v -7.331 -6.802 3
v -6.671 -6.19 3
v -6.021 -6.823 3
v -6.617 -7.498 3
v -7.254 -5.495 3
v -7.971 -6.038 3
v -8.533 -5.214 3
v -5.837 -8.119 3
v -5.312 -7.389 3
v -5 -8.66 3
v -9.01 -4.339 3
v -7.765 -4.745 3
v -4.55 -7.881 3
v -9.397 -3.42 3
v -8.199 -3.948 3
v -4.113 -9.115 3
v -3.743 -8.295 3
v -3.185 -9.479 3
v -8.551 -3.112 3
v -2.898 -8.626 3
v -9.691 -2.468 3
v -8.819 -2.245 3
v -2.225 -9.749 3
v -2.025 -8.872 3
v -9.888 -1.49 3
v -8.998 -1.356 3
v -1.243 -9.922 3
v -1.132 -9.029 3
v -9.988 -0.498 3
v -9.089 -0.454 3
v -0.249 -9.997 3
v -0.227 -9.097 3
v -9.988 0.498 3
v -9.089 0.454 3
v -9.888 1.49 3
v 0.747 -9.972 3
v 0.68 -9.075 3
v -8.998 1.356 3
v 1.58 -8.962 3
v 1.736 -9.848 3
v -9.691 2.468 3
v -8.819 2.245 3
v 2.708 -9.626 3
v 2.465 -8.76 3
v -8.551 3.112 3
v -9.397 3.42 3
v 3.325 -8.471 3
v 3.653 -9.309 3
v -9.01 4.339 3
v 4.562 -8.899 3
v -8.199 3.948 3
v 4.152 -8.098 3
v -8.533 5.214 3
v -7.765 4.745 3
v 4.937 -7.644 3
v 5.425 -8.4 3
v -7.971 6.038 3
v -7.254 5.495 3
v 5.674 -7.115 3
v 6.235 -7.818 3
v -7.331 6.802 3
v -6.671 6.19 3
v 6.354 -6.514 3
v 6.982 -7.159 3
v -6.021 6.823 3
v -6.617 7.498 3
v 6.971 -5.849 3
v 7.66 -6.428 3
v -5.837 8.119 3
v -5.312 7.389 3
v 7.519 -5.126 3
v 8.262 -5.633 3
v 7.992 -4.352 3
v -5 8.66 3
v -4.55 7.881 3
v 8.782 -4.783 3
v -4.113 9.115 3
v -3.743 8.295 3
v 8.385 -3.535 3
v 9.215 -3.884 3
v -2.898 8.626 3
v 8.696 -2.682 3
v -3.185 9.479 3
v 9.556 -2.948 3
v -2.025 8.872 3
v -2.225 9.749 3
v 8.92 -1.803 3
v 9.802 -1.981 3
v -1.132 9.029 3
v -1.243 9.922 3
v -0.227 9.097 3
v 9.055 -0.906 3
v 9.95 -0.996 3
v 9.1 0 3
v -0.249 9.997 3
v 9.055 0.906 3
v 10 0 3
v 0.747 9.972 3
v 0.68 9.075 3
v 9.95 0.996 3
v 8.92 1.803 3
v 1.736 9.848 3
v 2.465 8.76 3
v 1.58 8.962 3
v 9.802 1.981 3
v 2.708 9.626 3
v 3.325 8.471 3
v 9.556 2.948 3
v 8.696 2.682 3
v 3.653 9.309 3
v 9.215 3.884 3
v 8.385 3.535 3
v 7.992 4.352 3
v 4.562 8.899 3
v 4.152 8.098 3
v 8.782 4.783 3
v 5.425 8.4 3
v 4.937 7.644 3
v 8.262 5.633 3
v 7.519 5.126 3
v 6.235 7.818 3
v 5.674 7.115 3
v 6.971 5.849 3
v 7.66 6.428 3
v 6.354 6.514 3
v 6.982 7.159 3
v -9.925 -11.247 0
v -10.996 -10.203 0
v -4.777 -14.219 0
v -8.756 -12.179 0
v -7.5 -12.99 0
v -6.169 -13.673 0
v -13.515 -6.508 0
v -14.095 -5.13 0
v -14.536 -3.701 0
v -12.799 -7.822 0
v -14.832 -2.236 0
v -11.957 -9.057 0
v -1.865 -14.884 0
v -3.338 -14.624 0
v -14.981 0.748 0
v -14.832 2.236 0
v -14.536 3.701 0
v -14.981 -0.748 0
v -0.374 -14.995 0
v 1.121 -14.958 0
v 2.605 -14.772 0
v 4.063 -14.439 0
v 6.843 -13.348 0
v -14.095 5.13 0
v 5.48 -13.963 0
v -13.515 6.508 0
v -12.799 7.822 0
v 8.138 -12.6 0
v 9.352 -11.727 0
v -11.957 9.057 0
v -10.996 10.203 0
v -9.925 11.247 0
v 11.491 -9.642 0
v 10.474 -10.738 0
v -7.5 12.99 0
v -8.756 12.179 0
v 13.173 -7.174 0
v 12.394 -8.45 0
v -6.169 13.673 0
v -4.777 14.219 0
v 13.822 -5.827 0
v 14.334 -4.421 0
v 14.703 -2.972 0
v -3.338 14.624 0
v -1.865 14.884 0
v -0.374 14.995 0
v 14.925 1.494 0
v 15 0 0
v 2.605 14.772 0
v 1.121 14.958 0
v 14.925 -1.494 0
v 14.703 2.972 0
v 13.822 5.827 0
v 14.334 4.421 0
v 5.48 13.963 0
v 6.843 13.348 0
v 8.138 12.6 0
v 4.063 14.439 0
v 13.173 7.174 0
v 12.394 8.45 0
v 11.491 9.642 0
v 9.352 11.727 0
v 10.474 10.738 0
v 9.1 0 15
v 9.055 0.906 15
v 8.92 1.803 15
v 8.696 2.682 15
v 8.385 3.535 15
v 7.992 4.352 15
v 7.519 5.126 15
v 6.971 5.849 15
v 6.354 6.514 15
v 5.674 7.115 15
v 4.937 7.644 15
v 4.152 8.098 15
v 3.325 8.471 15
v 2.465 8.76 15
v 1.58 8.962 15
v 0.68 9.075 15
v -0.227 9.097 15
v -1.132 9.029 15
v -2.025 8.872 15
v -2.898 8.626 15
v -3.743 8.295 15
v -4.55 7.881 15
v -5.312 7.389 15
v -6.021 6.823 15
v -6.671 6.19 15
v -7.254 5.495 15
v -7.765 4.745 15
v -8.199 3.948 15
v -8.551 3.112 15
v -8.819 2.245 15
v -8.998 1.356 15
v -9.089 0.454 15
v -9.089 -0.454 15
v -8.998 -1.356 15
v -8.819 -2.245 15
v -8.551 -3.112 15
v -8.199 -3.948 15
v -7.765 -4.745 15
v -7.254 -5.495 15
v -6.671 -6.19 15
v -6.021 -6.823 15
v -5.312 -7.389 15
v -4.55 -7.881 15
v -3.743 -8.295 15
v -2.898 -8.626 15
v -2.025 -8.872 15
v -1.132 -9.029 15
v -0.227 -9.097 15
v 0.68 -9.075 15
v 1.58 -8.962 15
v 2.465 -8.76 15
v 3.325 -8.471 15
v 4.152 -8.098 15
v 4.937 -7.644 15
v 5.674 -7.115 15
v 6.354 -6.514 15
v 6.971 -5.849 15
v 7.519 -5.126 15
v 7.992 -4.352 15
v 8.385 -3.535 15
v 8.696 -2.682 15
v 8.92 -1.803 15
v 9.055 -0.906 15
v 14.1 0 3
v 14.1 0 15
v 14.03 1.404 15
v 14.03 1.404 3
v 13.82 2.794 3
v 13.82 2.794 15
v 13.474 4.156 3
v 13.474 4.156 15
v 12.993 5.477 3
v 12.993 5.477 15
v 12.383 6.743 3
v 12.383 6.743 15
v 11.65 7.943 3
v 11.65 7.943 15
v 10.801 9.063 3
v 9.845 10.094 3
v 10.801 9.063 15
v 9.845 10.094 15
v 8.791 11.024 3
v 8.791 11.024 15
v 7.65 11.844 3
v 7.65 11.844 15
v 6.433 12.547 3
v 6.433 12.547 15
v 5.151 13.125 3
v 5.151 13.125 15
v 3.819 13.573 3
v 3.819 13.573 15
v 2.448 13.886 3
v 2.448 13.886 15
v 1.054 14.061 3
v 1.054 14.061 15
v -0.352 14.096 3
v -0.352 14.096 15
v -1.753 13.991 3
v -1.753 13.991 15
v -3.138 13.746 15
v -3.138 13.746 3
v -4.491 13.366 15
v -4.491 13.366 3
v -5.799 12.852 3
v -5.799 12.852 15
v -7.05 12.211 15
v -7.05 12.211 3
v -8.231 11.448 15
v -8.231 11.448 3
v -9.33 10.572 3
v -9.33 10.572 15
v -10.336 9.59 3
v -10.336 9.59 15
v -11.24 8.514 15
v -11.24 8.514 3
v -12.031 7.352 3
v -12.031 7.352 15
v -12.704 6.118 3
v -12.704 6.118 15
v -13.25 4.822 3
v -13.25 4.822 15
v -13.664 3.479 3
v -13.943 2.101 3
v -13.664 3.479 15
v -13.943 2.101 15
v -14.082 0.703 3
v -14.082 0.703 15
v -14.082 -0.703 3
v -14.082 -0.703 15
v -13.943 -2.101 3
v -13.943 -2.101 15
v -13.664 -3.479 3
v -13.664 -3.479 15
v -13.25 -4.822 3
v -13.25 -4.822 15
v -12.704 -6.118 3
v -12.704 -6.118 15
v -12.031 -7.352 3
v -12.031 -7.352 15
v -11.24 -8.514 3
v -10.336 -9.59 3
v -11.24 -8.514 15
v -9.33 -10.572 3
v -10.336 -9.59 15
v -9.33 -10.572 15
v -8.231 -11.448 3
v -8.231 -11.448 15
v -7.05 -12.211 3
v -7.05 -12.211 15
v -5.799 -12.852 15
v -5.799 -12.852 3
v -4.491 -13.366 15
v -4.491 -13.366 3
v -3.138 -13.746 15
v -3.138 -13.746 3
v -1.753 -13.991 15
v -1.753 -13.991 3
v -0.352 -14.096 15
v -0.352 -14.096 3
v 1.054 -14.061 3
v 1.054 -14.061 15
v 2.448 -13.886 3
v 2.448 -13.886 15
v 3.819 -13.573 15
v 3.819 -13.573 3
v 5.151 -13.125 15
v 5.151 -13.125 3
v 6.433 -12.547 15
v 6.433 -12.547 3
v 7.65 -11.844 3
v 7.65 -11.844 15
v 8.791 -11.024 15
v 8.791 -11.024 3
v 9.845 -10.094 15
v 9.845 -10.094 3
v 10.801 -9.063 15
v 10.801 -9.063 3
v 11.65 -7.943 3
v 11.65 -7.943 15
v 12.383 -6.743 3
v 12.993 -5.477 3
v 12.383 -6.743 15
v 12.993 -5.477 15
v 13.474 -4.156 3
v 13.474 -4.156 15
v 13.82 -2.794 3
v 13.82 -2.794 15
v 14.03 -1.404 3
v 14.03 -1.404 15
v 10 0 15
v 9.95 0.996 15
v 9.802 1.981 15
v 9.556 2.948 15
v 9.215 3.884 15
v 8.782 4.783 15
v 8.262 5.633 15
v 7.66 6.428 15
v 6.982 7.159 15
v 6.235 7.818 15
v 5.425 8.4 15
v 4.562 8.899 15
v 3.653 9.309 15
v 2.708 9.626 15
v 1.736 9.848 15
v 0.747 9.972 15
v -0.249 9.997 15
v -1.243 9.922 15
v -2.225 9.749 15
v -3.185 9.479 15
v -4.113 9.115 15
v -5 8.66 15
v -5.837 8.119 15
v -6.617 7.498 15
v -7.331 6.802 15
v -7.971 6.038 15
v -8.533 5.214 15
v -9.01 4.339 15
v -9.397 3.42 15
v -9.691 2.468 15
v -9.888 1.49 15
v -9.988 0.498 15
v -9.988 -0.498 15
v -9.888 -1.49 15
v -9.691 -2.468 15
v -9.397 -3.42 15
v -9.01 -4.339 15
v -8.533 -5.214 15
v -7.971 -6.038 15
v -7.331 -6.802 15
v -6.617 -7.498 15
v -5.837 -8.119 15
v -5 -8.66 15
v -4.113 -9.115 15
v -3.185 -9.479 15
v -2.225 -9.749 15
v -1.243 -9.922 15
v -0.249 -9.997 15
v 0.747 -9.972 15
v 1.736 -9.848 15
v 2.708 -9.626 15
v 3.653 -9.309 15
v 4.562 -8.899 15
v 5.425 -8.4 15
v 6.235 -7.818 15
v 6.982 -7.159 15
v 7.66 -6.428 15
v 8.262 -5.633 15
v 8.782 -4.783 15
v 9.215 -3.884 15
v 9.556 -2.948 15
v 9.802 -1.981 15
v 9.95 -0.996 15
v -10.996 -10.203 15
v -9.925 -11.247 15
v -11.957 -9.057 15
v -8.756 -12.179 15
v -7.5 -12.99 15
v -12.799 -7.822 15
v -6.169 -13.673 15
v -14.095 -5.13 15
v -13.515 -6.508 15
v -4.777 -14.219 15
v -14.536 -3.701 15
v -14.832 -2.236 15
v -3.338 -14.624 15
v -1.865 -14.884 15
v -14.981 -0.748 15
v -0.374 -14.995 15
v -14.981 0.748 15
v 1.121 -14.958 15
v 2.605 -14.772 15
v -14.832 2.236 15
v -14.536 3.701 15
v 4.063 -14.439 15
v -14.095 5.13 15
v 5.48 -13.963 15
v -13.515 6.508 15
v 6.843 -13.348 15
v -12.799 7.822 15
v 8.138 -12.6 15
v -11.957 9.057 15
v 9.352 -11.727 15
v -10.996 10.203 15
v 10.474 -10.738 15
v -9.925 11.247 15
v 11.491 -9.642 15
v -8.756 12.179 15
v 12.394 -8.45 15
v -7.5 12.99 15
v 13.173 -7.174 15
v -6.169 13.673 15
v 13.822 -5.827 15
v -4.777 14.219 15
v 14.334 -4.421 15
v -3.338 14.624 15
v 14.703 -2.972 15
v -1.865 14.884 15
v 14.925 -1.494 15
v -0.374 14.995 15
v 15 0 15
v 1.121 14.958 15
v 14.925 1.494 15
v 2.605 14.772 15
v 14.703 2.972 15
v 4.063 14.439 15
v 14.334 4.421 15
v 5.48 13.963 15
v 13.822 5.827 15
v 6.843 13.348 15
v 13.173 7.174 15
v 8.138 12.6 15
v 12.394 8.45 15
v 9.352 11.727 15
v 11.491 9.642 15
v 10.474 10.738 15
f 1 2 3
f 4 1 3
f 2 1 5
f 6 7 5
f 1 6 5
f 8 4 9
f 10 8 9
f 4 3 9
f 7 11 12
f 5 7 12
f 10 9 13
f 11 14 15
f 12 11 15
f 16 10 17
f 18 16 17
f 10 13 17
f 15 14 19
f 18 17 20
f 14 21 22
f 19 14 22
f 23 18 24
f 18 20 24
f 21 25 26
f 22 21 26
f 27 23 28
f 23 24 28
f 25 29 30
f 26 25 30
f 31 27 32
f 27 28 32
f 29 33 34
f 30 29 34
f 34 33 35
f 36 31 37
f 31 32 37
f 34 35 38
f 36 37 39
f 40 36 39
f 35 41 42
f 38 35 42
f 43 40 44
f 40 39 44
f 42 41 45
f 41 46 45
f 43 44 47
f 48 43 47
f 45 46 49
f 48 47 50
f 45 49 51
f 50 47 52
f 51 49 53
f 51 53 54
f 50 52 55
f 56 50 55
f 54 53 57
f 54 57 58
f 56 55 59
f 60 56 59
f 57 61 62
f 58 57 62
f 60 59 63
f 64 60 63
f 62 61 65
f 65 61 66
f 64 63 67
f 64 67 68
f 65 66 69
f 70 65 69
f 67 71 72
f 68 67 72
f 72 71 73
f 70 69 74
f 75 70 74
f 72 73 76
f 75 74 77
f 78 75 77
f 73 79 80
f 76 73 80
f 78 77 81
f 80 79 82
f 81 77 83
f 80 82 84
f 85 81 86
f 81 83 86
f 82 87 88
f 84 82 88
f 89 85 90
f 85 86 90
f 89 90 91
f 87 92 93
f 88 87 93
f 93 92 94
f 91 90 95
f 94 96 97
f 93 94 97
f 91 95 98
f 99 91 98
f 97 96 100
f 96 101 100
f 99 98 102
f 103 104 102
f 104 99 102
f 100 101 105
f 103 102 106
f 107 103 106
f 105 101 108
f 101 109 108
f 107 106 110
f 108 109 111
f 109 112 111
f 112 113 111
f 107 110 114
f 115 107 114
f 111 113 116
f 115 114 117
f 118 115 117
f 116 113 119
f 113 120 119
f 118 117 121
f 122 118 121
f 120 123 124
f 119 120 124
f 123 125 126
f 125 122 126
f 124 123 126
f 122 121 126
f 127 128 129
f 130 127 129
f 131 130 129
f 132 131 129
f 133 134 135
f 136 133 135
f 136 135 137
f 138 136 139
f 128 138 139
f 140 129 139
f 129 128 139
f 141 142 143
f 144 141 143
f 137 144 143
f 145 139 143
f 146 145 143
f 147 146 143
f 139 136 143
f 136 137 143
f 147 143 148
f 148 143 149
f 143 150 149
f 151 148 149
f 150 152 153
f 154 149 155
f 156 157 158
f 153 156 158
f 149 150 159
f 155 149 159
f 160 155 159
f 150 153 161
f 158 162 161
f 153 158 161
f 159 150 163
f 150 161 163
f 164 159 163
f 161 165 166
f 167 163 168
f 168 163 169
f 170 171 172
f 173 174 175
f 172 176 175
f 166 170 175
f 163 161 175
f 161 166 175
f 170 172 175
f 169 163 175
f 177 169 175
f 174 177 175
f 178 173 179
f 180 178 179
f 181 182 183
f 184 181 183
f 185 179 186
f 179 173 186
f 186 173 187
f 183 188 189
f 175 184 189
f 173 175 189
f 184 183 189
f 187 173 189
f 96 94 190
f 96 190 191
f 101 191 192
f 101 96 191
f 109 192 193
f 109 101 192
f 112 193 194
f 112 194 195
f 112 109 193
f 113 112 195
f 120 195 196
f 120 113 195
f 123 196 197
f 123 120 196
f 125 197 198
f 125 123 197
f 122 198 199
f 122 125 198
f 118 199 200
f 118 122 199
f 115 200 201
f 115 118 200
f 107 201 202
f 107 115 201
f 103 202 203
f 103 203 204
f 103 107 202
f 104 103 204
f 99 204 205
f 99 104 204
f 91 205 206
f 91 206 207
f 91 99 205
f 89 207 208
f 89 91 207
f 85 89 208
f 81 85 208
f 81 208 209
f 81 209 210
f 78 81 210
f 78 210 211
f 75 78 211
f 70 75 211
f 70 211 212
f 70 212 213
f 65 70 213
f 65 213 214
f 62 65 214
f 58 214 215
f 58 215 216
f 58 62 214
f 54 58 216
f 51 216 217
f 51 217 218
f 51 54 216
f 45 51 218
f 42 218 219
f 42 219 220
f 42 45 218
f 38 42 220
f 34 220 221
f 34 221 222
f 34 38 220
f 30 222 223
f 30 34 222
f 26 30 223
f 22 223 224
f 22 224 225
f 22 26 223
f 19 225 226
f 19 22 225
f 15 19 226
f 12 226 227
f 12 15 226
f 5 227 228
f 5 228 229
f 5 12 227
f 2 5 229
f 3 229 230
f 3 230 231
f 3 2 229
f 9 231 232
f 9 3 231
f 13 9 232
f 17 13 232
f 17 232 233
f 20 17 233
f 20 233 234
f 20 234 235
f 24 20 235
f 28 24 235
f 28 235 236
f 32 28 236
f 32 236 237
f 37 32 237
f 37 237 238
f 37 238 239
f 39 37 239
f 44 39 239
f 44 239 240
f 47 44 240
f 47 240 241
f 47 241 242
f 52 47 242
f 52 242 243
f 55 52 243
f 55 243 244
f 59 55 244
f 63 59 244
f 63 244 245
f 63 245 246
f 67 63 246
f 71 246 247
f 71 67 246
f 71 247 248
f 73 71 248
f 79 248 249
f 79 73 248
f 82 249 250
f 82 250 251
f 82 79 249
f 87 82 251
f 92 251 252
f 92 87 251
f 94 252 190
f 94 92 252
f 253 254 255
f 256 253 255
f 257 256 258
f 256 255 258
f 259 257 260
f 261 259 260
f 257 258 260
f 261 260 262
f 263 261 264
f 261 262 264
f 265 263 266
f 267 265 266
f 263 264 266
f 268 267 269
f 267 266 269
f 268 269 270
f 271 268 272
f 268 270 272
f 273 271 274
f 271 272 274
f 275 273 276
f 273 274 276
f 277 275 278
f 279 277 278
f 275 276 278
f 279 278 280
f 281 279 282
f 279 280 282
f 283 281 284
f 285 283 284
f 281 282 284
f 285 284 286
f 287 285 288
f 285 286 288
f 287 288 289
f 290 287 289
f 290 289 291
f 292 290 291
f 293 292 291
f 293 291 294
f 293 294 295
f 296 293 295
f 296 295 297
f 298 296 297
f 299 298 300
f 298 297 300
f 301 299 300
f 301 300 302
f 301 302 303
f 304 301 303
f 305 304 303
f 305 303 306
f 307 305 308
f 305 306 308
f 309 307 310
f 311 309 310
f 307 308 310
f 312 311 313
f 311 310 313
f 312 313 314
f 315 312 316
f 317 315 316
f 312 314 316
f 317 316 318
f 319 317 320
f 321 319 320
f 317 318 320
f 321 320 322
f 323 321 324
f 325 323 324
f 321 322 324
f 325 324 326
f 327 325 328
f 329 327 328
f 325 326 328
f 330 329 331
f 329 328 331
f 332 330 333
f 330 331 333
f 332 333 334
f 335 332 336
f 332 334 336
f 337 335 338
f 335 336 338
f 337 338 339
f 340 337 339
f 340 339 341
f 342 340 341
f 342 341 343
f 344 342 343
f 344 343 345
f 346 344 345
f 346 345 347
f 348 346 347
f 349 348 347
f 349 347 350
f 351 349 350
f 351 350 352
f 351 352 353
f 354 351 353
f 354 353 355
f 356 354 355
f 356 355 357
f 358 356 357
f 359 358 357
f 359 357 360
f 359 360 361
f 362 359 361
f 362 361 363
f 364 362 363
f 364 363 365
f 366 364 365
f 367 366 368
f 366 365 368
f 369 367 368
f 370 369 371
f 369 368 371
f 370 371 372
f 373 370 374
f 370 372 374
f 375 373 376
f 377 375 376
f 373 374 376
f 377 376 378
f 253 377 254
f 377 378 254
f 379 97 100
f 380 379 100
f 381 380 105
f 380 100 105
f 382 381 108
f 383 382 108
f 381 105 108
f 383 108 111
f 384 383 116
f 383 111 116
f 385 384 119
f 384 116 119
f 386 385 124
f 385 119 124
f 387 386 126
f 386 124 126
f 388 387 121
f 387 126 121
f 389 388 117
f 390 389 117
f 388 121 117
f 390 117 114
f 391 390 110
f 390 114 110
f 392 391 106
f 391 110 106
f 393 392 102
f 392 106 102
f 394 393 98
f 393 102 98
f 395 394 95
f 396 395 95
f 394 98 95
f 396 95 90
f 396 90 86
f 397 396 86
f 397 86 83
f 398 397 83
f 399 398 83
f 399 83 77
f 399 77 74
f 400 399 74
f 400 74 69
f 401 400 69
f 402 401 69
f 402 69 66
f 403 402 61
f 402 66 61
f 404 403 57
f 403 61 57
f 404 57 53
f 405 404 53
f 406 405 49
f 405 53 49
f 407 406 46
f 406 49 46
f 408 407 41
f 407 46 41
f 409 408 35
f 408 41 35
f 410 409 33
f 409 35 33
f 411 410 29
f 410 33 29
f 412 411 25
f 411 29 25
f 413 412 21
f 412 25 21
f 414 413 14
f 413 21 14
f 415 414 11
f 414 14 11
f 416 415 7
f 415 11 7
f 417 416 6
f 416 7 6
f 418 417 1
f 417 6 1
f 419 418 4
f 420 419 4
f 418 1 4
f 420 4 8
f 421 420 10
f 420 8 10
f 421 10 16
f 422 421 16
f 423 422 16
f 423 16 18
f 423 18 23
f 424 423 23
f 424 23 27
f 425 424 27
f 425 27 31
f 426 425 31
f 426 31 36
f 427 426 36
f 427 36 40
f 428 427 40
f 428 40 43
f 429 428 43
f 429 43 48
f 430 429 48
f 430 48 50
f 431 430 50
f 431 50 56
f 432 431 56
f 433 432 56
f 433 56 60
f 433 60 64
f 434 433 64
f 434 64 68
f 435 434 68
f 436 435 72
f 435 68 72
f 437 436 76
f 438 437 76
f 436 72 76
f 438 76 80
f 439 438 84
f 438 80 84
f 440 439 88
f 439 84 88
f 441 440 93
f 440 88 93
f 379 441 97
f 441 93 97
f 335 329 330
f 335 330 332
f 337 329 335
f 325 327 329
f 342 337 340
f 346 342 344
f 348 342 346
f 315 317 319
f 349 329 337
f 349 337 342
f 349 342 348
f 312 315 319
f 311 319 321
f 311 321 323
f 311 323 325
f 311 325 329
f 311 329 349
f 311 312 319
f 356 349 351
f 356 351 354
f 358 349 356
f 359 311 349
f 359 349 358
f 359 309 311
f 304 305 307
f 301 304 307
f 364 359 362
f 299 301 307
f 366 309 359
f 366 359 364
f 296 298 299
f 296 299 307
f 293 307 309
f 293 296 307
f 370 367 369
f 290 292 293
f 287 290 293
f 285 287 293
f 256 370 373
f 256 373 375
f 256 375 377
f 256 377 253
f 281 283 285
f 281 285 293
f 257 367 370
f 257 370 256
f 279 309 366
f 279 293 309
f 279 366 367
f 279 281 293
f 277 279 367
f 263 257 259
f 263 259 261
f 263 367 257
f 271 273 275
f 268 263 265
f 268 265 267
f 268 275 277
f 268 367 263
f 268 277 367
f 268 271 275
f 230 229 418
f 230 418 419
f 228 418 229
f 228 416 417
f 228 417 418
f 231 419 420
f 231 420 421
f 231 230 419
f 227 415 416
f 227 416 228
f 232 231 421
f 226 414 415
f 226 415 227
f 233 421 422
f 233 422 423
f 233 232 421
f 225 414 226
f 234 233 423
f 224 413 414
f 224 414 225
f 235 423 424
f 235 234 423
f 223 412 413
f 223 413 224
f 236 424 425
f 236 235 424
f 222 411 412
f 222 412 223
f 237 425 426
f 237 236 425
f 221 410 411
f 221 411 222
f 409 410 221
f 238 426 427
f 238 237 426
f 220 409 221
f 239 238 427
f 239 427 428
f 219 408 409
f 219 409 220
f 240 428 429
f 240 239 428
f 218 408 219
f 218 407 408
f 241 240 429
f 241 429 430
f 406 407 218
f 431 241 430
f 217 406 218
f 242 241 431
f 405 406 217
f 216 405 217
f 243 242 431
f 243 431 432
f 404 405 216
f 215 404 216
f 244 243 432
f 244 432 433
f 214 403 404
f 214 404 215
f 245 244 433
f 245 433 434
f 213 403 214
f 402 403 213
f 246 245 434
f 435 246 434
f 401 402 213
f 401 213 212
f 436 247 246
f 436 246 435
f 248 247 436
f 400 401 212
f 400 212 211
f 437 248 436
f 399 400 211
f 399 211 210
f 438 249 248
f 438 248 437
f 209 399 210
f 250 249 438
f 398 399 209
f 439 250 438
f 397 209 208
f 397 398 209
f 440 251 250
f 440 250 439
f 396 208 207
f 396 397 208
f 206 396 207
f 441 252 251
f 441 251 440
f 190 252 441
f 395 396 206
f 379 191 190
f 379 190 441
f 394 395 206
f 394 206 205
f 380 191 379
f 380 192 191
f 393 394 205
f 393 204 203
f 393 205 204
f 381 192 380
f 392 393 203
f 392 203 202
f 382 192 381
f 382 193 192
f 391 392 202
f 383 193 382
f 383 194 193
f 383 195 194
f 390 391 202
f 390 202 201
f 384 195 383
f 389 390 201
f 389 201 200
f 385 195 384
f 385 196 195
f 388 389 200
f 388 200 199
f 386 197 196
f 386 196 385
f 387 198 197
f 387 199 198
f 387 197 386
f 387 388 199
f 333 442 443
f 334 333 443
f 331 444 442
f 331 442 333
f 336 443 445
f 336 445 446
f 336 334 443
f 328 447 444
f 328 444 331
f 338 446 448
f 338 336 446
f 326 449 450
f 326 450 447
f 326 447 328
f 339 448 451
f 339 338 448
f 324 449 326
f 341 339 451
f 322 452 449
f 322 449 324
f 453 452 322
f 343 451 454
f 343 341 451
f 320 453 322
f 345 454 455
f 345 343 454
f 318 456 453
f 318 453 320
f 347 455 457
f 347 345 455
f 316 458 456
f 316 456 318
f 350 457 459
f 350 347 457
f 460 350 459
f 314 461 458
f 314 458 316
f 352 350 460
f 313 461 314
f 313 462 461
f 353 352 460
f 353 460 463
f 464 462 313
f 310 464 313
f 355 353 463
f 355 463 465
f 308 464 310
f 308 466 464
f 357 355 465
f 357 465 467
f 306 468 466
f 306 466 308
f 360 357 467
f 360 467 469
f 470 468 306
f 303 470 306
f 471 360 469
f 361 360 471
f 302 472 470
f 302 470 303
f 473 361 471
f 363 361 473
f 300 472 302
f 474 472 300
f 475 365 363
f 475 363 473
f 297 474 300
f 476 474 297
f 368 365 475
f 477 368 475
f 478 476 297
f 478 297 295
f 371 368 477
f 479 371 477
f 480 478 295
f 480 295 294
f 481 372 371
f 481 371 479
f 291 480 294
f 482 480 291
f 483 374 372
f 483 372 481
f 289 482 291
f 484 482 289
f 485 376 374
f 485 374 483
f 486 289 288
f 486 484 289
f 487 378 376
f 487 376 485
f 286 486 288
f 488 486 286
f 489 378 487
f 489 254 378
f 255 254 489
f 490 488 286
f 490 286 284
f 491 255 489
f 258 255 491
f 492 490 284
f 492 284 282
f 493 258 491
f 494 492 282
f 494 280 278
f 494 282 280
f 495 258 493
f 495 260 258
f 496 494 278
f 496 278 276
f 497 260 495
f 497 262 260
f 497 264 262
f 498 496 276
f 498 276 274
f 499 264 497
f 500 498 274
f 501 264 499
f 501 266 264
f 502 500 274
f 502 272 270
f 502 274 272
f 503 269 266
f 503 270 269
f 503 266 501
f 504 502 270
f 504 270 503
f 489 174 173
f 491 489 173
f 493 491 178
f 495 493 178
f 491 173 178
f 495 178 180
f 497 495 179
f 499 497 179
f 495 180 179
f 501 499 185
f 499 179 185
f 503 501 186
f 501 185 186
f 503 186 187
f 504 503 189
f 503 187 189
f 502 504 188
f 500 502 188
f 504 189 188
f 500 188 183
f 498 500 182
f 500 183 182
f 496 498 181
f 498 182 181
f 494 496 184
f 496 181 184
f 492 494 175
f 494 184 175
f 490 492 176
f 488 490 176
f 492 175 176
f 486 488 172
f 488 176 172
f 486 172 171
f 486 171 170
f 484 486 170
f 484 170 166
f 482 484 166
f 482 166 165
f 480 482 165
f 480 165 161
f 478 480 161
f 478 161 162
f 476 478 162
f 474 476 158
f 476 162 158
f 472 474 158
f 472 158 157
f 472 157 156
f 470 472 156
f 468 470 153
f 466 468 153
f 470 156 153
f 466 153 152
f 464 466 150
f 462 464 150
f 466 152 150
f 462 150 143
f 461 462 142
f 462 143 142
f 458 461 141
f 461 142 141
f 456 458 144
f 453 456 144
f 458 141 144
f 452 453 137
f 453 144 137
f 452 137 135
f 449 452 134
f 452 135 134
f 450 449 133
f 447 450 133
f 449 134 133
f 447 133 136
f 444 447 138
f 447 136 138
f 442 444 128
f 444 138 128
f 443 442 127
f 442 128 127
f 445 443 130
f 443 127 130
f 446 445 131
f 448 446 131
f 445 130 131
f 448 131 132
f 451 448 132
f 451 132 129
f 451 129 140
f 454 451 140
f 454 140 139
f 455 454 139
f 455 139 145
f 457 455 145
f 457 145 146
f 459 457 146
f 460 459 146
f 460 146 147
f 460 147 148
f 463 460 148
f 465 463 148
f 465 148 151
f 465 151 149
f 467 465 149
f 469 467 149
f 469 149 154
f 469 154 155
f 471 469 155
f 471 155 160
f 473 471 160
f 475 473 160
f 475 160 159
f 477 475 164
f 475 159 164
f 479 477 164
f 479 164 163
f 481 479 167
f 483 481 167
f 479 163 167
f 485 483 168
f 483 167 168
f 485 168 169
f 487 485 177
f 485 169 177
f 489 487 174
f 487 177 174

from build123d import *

# Parameters (mm, degrees)
F0_R     = 15
F1_DEPTH = 15
F2_R     = 14.1
F3_DEPTH = 12
F4_R     = 10
F4_R_2   = 9.1
F5_DEPTH = 12


with BuildPart() as f1:
    # F0 (on Top) → F1 (new body)
    with BuildSketch(Plane.XY):
        Circle(F0_R)
    extrude(amount=F1_DEPTH)

    # F2 (on face) → F3 (cut)
    with BuildSketch(Plane.XY.offset(15)):
        Circle(F2_R)
    extrude(amount=-F3_DEPTH, mode=Mode.SUBTRACT)


with BuildPart() as f5:
    # F4 (on face) → F5 (new body, through all)
    with BuildSketch(Plane.XY.offset(3)):
        Circle(F4_R)
        Circle(F4_R_2, mode=Mode.SUBTRACT)
    extrude(amount=F5_DEPTH)


solid = Compound([f1.part, f5.part])
